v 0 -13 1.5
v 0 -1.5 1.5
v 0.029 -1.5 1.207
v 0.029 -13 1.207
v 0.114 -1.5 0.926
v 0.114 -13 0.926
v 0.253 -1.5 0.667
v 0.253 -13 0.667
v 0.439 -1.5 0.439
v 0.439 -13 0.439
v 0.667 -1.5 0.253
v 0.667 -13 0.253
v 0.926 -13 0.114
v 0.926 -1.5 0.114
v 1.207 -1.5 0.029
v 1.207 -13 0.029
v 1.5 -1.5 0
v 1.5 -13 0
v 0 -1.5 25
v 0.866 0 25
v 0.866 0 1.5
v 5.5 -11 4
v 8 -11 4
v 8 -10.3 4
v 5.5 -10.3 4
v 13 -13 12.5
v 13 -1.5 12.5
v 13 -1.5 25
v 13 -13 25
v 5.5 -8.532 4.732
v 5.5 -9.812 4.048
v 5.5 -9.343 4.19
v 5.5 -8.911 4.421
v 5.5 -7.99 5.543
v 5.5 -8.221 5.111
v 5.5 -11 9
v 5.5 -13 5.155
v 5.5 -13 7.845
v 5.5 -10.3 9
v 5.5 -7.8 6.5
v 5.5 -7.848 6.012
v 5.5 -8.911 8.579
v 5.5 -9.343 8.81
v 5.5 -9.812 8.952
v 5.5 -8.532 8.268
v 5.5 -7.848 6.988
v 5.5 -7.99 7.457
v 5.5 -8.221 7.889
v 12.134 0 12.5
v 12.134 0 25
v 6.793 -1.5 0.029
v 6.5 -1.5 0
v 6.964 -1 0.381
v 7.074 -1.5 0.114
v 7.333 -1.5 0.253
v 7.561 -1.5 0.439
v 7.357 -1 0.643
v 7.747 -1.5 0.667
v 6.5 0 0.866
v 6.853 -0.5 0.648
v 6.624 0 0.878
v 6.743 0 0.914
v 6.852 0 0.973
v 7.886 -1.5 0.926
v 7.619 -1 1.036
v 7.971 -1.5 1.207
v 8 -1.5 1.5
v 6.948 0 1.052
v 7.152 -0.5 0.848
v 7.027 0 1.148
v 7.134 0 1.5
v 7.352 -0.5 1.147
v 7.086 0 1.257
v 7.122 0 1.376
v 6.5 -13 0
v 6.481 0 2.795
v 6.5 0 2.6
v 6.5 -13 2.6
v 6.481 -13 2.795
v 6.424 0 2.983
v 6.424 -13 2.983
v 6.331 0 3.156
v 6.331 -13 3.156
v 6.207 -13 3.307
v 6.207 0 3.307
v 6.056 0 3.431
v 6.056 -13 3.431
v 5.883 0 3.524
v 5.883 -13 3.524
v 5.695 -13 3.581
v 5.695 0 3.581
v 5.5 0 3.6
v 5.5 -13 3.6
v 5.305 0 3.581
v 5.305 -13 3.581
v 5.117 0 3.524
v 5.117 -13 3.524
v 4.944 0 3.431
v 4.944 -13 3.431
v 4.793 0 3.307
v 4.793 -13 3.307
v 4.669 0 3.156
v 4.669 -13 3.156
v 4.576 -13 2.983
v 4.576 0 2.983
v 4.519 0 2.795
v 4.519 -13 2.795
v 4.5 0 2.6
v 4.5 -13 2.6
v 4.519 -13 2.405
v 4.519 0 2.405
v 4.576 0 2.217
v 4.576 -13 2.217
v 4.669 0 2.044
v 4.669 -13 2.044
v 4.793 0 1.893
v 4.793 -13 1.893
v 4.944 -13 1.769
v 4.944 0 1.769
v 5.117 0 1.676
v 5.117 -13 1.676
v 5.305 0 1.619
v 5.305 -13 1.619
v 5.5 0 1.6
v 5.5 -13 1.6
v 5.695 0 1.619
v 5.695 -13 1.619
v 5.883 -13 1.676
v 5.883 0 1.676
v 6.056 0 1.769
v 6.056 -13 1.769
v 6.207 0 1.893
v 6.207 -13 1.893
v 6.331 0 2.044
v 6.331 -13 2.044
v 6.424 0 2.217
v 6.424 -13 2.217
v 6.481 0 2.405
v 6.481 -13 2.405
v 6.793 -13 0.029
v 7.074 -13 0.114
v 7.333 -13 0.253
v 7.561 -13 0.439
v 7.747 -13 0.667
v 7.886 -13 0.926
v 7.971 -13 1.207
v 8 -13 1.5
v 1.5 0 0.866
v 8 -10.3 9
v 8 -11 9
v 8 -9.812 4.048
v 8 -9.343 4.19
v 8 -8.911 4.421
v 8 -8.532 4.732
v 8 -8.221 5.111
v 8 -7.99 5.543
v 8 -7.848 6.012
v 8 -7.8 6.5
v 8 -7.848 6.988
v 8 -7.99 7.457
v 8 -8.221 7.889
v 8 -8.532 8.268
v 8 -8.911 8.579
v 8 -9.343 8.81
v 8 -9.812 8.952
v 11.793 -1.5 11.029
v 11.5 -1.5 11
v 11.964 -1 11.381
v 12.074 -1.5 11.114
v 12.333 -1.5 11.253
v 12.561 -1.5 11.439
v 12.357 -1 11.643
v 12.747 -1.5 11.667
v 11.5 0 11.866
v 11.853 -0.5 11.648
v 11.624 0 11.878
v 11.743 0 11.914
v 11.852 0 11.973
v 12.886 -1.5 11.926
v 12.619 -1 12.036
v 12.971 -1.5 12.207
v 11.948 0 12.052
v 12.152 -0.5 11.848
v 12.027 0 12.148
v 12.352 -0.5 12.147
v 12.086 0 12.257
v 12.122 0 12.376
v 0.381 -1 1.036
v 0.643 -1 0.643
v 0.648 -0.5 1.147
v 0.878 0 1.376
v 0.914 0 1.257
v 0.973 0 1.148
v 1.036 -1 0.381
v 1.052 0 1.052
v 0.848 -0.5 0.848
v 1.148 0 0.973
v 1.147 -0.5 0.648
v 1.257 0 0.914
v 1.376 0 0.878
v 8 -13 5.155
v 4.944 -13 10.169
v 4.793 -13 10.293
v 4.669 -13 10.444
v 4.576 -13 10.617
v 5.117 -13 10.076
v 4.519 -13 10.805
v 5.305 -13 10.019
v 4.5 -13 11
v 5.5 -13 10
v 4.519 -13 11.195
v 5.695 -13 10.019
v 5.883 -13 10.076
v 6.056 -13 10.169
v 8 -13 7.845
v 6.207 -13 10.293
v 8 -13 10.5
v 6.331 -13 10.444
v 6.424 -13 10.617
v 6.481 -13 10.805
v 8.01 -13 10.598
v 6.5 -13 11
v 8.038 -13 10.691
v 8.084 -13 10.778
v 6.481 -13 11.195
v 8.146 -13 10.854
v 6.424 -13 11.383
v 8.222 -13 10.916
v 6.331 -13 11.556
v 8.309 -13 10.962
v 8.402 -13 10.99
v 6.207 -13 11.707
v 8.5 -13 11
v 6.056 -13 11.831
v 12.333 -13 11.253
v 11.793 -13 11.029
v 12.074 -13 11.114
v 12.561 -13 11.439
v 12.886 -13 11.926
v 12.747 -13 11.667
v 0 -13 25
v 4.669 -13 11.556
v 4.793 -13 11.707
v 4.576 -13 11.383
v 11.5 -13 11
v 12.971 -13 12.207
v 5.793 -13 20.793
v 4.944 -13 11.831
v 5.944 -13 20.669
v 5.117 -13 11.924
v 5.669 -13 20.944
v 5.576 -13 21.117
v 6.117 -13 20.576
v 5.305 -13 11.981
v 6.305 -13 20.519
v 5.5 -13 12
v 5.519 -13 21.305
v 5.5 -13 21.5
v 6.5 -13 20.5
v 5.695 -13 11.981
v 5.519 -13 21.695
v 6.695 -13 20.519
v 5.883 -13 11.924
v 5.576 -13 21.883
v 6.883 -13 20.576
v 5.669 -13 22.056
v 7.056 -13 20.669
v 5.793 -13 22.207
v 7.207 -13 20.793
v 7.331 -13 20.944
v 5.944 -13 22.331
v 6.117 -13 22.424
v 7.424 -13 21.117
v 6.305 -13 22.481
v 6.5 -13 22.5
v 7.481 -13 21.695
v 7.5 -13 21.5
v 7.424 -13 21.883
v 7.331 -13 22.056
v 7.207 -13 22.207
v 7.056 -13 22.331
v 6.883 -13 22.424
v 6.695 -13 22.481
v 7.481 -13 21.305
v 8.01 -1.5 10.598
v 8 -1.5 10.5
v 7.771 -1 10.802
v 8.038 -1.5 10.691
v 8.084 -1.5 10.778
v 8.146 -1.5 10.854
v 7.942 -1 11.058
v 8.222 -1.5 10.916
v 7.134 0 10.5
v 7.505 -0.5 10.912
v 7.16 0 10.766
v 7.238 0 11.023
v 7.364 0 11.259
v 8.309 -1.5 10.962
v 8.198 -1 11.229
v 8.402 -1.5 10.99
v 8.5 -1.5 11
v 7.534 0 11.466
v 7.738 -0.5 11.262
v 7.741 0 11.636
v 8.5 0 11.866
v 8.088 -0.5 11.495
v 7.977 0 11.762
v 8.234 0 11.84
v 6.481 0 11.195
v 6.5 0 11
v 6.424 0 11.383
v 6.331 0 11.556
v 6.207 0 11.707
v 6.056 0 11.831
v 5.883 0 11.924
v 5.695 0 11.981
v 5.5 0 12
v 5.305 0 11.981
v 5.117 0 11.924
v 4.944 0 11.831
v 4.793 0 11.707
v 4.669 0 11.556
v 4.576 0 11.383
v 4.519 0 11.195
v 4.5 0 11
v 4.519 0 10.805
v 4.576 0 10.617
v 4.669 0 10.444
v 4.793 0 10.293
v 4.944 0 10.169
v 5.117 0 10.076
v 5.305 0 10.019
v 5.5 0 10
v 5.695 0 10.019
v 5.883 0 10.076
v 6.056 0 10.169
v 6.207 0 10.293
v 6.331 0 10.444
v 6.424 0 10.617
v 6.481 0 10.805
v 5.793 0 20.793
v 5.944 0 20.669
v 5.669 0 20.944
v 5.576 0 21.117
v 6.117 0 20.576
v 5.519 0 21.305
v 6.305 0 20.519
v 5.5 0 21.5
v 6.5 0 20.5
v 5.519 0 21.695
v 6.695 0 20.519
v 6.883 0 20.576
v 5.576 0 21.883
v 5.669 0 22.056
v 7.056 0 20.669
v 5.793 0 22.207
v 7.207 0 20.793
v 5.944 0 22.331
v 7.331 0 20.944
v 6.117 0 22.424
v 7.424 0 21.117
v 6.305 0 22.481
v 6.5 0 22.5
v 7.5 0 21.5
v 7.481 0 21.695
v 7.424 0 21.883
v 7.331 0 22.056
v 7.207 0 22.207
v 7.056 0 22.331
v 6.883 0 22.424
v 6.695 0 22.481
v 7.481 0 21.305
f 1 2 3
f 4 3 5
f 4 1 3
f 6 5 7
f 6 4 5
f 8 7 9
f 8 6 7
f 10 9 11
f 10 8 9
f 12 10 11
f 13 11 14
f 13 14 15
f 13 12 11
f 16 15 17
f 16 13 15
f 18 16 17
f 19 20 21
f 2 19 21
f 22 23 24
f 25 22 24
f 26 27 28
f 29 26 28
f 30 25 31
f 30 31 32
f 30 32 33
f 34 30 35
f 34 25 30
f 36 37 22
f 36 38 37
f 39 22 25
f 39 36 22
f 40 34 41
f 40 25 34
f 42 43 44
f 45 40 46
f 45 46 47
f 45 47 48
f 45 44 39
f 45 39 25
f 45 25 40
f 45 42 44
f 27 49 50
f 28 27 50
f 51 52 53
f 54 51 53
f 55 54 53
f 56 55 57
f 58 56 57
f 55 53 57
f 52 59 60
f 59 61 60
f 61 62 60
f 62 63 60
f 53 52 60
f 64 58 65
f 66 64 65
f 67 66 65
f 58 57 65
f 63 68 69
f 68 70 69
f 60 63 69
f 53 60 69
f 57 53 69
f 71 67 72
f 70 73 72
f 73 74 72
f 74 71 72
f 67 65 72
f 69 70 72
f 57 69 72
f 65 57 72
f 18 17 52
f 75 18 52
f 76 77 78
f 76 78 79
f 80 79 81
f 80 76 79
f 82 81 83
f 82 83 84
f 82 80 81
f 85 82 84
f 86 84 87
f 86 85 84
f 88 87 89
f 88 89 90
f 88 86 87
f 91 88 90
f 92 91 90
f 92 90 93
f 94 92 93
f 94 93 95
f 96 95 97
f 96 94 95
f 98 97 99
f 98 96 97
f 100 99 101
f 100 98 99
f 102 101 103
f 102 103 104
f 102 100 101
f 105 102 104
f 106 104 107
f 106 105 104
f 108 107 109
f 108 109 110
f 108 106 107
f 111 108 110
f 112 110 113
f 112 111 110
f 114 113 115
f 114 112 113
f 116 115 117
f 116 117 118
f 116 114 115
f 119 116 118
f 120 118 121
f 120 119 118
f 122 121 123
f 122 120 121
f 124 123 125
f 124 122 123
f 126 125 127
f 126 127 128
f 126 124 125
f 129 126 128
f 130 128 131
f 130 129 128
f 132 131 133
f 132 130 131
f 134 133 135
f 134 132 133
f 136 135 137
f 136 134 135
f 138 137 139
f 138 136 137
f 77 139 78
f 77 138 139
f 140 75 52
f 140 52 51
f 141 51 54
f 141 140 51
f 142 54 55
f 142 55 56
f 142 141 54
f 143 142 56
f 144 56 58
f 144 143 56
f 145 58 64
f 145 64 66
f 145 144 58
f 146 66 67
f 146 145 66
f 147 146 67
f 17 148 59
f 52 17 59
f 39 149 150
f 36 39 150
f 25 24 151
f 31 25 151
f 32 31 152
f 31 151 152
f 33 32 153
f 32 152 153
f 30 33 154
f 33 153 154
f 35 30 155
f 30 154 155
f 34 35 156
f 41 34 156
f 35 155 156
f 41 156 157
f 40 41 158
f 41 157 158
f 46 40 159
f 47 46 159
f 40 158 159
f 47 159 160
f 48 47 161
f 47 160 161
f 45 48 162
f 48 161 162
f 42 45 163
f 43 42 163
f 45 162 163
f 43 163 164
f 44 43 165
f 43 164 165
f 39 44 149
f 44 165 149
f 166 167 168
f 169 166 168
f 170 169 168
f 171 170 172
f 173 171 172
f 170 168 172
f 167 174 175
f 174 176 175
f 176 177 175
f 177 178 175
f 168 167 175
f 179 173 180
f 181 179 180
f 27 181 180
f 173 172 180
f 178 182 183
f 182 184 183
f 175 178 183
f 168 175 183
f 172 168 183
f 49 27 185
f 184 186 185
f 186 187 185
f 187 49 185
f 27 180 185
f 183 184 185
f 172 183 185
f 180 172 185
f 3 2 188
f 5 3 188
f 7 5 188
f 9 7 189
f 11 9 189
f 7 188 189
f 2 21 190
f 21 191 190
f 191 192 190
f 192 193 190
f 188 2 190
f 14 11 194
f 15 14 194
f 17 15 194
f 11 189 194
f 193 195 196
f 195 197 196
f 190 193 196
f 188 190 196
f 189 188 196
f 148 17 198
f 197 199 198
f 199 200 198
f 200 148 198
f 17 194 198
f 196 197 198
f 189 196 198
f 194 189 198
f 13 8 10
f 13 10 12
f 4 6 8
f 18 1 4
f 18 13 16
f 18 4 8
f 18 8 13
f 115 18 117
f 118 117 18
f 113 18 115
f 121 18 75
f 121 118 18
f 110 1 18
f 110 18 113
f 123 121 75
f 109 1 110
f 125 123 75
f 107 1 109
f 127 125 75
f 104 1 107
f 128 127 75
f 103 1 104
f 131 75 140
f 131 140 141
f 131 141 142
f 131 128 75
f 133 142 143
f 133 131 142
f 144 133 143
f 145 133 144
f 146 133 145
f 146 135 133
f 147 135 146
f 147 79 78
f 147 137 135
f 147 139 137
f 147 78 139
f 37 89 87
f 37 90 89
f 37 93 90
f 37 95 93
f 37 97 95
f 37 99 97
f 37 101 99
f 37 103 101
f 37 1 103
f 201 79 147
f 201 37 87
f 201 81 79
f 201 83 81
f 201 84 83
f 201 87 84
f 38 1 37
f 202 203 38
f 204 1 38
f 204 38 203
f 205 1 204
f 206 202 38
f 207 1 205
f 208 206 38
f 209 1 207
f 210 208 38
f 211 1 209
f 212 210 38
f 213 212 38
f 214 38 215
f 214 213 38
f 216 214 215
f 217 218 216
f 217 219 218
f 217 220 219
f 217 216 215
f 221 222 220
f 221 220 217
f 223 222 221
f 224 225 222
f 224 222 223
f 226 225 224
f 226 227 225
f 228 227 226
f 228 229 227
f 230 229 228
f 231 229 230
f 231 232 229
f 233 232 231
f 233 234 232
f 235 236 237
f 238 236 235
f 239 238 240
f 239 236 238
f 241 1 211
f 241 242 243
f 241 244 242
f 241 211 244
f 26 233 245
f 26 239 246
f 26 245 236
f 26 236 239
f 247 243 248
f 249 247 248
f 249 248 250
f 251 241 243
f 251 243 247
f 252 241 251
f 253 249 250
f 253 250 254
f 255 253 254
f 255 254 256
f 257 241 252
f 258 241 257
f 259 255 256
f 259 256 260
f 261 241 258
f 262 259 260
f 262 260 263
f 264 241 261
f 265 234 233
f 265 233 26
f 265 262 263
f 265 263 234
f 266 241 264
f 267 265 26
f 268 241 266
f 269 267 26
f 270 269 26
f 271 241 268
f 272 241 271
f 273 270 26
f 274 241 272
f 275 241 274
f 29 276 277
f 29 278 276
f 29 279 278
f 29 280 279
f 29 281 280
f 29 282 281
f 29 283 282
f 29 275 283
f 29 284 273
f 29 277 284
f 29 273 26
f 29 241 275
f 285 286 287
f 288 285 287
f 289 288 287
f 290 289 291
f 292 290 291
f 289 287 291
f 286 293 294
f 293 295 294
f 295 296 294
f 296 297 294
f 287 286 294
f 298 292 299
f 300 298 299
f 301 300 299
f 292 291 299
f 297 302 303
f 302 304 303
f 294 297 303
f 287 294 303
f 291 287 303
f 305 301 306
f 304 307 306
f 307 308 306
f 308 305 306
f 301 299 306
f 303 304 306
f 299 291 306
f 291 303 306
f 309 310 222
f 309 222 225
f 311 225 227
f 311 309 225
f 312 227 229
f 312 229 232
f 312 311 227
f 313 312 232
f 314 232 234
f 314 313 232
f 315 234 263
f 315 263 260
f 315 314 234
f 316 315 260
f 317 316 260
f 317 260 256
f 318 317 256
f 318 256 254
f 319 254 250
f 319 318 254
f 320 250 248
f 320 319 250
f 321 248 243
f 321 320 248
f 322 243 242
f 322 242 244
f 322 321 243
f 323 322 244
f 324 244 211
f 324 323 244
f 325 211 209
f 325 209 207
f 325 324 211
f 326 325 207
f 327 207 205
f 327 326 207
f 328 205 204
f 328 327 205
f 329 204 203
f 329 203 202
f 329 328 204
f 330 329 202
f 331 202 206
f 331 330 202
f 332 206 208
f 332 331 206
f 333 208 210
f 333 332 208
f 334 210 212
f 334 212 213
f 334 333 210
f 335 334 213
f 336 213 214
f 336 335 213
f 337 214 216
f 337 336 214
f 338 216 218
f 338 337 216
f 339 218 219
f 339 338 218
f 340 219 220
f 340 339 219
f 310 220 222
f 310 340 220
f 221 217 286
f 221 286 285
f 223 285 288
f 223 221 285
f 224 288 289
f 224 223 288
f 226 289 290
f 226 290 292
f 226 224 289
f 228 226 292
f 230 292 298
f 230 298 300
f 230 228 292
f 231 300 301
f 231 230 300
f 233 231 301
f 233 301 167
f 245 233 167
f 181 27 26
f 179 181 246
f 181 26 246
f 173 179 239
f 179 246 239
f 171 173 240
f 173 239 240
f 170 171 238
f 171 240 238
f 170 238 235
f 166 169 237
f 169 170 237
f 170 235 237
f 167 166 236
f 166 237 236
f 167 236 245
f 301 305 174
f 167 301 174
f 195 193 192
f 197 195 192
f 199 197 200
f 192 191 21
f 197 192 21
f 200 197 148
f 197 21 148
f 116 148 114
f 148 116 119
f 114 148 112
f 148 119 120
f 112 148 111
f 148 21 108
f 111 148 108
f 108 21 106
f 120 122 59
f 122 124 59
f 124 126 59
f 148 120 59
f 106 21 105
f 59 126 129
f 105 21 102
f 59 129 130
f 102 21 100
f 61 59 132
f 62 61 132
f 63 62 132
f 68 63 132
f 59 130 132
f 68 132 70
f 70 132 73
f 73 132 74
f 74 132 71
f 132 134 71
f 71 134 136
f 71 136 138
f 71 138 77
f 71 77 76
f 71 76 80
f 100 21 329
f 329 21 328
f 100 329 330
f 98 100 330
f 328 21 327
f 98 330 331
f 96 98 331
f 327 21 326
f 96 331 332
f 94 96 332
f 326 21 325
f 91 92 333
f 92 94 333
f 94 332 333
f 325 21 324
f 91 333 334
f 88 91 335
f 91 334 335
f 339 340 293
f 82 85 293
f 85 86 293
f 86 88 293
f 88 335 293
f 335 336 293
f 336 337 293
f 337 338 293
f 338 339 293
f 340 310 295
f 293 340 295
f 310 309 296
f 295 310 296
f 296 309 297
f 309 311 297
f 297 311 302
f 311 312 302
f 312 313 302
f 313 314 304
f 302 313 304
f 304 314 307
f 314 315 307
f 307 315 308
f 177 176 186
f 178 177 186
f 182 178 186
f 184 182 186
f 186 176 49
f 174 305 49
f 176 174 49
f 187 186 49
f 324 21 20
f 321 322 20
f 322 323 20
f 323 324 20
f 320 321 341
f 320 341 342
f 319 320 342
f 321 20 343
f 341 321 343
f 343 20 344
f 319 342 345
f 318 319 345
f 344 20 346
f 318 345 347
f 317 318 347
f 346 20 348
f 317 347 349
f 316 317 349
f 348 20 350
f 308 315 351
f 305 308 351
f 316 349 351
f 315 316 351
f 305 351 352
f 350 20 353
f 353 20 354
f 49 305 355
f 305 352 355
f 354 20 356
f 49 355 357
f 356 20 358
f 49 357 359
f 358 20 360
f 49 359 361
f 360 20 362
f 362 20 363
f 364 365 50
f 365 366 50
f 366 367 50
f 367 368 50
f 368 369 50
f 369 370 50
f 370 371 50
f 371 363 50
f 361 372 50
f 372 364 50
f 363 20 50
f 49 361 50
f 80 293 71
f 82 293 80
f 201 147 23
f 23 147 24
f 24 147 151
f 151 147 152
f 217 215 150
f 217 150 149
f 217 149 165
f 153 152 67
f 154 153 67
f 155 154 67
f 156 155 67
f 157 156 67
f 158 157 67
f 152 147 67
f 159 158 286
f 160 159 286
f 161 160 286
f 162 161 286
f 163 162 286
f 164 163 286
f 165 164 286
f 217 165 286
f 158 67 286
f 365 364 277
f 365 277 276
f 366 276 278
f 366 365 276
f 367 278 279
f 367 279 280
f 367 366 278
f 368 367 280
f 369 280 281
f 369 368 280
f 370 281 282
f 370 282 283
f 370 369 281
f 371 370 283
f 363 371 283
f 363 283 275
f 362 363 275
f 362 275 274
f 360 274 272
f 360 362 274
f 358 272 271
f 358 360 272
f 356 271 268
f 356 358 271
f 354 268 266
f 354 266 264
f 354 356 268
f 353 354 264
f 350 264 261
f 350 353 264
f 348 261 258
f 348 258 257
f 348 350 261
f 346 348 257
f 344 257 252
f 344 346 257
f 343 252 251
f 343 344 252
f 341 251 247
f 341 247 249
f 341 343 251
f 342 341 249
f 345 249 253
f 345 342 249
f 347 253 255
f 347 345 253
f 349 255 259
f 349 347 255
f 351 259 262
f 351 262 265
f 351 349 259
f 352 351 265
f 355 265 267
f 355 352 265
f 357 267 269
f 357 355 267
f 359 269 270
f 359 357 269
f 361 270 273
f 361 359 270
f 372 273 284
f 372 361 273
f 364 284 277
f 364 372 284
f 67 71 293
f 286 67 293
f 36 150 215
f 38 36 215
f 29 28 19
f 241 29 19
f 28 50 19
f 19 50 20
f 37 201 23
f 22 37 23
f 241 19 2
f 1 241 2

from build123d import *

# Parameters (mm, degrees)
F0_R     = 1
F1_DEPTH = 13
F3_DEPTH = 2.5
F4_R     = 1.5
F5_R     = 0.5
F6_SIZE2 = 0.8660254038
F6_SIZE  = 1.5


with BuildPart() as f1:
    # F0 (on Front) → F1 (new body)
    with BuildSketch(Plane.XZ):
        Polygon((0, 25), (0, 0), (8, 0), (8, 11), (13, 11), (13, 25), align=None)
        with Locations((5.5, 2.6)):
            Circle(F0_R, mode=Mode.SUBTRACT)
        with Locations((5.5, 11)):
            Circle(F0_R, mode=Mode.SUBTRACT)
        with Locations((6.5, 21.5)):
            Circle(F0_R, mode=Mode.SUBTRACT)
    extrude(amount=F1_DEPTH)

    # F2 (on face) → F3 (cut)
    with BuildSketch(Plane.YZ.offset(8)):
        with BuildLine():
            Line((-13, 5.1547005384), (-11, 4))
            Line((-11, 4), (-10.3, 4))
            ThreePointArc((-10.3, 4), (-7.8, 6.5), (-10.3, 9))
            Line((-10.3, 9), (-11, 9))
            Line((-11, 9), (-13, 7.8452994616))
            Line((-13, 7.8452994616), (-13, 5.1547005384))
        make_face()
    extrude(amount=-F3_DEPTH, mode=Mode.SUBTRACT)

    # F4
    f4_edges = [f1.edges().sort_by_distance(p)[0] for p in [
        (8, -6.5, 0),
        (0, -6.5, 0),
        (13, -6.5, 11),
    ]]
    fillet(f4_edges, radius=F4_R)

    # F5
    f5_edges = [f1.edges().sort_by_distance(p)[0] for p in [
        (8, -6.5, 11),
    ]]
    fillet(f5_edges, radius=F5_R)

    # F6
    f6_edges = [f1.edges().sort_by_distance(p)[0] for p in [
        (13, 0, 18.75),
    ]]
    f6_side = f1.faces().sort_by_distance((13, -6.5, 18.75))[0]
    chamfer(f6_edges, length=F6_SIZE, length2=F6_SIZE2, reference=f6_side)


solid = f1.part
